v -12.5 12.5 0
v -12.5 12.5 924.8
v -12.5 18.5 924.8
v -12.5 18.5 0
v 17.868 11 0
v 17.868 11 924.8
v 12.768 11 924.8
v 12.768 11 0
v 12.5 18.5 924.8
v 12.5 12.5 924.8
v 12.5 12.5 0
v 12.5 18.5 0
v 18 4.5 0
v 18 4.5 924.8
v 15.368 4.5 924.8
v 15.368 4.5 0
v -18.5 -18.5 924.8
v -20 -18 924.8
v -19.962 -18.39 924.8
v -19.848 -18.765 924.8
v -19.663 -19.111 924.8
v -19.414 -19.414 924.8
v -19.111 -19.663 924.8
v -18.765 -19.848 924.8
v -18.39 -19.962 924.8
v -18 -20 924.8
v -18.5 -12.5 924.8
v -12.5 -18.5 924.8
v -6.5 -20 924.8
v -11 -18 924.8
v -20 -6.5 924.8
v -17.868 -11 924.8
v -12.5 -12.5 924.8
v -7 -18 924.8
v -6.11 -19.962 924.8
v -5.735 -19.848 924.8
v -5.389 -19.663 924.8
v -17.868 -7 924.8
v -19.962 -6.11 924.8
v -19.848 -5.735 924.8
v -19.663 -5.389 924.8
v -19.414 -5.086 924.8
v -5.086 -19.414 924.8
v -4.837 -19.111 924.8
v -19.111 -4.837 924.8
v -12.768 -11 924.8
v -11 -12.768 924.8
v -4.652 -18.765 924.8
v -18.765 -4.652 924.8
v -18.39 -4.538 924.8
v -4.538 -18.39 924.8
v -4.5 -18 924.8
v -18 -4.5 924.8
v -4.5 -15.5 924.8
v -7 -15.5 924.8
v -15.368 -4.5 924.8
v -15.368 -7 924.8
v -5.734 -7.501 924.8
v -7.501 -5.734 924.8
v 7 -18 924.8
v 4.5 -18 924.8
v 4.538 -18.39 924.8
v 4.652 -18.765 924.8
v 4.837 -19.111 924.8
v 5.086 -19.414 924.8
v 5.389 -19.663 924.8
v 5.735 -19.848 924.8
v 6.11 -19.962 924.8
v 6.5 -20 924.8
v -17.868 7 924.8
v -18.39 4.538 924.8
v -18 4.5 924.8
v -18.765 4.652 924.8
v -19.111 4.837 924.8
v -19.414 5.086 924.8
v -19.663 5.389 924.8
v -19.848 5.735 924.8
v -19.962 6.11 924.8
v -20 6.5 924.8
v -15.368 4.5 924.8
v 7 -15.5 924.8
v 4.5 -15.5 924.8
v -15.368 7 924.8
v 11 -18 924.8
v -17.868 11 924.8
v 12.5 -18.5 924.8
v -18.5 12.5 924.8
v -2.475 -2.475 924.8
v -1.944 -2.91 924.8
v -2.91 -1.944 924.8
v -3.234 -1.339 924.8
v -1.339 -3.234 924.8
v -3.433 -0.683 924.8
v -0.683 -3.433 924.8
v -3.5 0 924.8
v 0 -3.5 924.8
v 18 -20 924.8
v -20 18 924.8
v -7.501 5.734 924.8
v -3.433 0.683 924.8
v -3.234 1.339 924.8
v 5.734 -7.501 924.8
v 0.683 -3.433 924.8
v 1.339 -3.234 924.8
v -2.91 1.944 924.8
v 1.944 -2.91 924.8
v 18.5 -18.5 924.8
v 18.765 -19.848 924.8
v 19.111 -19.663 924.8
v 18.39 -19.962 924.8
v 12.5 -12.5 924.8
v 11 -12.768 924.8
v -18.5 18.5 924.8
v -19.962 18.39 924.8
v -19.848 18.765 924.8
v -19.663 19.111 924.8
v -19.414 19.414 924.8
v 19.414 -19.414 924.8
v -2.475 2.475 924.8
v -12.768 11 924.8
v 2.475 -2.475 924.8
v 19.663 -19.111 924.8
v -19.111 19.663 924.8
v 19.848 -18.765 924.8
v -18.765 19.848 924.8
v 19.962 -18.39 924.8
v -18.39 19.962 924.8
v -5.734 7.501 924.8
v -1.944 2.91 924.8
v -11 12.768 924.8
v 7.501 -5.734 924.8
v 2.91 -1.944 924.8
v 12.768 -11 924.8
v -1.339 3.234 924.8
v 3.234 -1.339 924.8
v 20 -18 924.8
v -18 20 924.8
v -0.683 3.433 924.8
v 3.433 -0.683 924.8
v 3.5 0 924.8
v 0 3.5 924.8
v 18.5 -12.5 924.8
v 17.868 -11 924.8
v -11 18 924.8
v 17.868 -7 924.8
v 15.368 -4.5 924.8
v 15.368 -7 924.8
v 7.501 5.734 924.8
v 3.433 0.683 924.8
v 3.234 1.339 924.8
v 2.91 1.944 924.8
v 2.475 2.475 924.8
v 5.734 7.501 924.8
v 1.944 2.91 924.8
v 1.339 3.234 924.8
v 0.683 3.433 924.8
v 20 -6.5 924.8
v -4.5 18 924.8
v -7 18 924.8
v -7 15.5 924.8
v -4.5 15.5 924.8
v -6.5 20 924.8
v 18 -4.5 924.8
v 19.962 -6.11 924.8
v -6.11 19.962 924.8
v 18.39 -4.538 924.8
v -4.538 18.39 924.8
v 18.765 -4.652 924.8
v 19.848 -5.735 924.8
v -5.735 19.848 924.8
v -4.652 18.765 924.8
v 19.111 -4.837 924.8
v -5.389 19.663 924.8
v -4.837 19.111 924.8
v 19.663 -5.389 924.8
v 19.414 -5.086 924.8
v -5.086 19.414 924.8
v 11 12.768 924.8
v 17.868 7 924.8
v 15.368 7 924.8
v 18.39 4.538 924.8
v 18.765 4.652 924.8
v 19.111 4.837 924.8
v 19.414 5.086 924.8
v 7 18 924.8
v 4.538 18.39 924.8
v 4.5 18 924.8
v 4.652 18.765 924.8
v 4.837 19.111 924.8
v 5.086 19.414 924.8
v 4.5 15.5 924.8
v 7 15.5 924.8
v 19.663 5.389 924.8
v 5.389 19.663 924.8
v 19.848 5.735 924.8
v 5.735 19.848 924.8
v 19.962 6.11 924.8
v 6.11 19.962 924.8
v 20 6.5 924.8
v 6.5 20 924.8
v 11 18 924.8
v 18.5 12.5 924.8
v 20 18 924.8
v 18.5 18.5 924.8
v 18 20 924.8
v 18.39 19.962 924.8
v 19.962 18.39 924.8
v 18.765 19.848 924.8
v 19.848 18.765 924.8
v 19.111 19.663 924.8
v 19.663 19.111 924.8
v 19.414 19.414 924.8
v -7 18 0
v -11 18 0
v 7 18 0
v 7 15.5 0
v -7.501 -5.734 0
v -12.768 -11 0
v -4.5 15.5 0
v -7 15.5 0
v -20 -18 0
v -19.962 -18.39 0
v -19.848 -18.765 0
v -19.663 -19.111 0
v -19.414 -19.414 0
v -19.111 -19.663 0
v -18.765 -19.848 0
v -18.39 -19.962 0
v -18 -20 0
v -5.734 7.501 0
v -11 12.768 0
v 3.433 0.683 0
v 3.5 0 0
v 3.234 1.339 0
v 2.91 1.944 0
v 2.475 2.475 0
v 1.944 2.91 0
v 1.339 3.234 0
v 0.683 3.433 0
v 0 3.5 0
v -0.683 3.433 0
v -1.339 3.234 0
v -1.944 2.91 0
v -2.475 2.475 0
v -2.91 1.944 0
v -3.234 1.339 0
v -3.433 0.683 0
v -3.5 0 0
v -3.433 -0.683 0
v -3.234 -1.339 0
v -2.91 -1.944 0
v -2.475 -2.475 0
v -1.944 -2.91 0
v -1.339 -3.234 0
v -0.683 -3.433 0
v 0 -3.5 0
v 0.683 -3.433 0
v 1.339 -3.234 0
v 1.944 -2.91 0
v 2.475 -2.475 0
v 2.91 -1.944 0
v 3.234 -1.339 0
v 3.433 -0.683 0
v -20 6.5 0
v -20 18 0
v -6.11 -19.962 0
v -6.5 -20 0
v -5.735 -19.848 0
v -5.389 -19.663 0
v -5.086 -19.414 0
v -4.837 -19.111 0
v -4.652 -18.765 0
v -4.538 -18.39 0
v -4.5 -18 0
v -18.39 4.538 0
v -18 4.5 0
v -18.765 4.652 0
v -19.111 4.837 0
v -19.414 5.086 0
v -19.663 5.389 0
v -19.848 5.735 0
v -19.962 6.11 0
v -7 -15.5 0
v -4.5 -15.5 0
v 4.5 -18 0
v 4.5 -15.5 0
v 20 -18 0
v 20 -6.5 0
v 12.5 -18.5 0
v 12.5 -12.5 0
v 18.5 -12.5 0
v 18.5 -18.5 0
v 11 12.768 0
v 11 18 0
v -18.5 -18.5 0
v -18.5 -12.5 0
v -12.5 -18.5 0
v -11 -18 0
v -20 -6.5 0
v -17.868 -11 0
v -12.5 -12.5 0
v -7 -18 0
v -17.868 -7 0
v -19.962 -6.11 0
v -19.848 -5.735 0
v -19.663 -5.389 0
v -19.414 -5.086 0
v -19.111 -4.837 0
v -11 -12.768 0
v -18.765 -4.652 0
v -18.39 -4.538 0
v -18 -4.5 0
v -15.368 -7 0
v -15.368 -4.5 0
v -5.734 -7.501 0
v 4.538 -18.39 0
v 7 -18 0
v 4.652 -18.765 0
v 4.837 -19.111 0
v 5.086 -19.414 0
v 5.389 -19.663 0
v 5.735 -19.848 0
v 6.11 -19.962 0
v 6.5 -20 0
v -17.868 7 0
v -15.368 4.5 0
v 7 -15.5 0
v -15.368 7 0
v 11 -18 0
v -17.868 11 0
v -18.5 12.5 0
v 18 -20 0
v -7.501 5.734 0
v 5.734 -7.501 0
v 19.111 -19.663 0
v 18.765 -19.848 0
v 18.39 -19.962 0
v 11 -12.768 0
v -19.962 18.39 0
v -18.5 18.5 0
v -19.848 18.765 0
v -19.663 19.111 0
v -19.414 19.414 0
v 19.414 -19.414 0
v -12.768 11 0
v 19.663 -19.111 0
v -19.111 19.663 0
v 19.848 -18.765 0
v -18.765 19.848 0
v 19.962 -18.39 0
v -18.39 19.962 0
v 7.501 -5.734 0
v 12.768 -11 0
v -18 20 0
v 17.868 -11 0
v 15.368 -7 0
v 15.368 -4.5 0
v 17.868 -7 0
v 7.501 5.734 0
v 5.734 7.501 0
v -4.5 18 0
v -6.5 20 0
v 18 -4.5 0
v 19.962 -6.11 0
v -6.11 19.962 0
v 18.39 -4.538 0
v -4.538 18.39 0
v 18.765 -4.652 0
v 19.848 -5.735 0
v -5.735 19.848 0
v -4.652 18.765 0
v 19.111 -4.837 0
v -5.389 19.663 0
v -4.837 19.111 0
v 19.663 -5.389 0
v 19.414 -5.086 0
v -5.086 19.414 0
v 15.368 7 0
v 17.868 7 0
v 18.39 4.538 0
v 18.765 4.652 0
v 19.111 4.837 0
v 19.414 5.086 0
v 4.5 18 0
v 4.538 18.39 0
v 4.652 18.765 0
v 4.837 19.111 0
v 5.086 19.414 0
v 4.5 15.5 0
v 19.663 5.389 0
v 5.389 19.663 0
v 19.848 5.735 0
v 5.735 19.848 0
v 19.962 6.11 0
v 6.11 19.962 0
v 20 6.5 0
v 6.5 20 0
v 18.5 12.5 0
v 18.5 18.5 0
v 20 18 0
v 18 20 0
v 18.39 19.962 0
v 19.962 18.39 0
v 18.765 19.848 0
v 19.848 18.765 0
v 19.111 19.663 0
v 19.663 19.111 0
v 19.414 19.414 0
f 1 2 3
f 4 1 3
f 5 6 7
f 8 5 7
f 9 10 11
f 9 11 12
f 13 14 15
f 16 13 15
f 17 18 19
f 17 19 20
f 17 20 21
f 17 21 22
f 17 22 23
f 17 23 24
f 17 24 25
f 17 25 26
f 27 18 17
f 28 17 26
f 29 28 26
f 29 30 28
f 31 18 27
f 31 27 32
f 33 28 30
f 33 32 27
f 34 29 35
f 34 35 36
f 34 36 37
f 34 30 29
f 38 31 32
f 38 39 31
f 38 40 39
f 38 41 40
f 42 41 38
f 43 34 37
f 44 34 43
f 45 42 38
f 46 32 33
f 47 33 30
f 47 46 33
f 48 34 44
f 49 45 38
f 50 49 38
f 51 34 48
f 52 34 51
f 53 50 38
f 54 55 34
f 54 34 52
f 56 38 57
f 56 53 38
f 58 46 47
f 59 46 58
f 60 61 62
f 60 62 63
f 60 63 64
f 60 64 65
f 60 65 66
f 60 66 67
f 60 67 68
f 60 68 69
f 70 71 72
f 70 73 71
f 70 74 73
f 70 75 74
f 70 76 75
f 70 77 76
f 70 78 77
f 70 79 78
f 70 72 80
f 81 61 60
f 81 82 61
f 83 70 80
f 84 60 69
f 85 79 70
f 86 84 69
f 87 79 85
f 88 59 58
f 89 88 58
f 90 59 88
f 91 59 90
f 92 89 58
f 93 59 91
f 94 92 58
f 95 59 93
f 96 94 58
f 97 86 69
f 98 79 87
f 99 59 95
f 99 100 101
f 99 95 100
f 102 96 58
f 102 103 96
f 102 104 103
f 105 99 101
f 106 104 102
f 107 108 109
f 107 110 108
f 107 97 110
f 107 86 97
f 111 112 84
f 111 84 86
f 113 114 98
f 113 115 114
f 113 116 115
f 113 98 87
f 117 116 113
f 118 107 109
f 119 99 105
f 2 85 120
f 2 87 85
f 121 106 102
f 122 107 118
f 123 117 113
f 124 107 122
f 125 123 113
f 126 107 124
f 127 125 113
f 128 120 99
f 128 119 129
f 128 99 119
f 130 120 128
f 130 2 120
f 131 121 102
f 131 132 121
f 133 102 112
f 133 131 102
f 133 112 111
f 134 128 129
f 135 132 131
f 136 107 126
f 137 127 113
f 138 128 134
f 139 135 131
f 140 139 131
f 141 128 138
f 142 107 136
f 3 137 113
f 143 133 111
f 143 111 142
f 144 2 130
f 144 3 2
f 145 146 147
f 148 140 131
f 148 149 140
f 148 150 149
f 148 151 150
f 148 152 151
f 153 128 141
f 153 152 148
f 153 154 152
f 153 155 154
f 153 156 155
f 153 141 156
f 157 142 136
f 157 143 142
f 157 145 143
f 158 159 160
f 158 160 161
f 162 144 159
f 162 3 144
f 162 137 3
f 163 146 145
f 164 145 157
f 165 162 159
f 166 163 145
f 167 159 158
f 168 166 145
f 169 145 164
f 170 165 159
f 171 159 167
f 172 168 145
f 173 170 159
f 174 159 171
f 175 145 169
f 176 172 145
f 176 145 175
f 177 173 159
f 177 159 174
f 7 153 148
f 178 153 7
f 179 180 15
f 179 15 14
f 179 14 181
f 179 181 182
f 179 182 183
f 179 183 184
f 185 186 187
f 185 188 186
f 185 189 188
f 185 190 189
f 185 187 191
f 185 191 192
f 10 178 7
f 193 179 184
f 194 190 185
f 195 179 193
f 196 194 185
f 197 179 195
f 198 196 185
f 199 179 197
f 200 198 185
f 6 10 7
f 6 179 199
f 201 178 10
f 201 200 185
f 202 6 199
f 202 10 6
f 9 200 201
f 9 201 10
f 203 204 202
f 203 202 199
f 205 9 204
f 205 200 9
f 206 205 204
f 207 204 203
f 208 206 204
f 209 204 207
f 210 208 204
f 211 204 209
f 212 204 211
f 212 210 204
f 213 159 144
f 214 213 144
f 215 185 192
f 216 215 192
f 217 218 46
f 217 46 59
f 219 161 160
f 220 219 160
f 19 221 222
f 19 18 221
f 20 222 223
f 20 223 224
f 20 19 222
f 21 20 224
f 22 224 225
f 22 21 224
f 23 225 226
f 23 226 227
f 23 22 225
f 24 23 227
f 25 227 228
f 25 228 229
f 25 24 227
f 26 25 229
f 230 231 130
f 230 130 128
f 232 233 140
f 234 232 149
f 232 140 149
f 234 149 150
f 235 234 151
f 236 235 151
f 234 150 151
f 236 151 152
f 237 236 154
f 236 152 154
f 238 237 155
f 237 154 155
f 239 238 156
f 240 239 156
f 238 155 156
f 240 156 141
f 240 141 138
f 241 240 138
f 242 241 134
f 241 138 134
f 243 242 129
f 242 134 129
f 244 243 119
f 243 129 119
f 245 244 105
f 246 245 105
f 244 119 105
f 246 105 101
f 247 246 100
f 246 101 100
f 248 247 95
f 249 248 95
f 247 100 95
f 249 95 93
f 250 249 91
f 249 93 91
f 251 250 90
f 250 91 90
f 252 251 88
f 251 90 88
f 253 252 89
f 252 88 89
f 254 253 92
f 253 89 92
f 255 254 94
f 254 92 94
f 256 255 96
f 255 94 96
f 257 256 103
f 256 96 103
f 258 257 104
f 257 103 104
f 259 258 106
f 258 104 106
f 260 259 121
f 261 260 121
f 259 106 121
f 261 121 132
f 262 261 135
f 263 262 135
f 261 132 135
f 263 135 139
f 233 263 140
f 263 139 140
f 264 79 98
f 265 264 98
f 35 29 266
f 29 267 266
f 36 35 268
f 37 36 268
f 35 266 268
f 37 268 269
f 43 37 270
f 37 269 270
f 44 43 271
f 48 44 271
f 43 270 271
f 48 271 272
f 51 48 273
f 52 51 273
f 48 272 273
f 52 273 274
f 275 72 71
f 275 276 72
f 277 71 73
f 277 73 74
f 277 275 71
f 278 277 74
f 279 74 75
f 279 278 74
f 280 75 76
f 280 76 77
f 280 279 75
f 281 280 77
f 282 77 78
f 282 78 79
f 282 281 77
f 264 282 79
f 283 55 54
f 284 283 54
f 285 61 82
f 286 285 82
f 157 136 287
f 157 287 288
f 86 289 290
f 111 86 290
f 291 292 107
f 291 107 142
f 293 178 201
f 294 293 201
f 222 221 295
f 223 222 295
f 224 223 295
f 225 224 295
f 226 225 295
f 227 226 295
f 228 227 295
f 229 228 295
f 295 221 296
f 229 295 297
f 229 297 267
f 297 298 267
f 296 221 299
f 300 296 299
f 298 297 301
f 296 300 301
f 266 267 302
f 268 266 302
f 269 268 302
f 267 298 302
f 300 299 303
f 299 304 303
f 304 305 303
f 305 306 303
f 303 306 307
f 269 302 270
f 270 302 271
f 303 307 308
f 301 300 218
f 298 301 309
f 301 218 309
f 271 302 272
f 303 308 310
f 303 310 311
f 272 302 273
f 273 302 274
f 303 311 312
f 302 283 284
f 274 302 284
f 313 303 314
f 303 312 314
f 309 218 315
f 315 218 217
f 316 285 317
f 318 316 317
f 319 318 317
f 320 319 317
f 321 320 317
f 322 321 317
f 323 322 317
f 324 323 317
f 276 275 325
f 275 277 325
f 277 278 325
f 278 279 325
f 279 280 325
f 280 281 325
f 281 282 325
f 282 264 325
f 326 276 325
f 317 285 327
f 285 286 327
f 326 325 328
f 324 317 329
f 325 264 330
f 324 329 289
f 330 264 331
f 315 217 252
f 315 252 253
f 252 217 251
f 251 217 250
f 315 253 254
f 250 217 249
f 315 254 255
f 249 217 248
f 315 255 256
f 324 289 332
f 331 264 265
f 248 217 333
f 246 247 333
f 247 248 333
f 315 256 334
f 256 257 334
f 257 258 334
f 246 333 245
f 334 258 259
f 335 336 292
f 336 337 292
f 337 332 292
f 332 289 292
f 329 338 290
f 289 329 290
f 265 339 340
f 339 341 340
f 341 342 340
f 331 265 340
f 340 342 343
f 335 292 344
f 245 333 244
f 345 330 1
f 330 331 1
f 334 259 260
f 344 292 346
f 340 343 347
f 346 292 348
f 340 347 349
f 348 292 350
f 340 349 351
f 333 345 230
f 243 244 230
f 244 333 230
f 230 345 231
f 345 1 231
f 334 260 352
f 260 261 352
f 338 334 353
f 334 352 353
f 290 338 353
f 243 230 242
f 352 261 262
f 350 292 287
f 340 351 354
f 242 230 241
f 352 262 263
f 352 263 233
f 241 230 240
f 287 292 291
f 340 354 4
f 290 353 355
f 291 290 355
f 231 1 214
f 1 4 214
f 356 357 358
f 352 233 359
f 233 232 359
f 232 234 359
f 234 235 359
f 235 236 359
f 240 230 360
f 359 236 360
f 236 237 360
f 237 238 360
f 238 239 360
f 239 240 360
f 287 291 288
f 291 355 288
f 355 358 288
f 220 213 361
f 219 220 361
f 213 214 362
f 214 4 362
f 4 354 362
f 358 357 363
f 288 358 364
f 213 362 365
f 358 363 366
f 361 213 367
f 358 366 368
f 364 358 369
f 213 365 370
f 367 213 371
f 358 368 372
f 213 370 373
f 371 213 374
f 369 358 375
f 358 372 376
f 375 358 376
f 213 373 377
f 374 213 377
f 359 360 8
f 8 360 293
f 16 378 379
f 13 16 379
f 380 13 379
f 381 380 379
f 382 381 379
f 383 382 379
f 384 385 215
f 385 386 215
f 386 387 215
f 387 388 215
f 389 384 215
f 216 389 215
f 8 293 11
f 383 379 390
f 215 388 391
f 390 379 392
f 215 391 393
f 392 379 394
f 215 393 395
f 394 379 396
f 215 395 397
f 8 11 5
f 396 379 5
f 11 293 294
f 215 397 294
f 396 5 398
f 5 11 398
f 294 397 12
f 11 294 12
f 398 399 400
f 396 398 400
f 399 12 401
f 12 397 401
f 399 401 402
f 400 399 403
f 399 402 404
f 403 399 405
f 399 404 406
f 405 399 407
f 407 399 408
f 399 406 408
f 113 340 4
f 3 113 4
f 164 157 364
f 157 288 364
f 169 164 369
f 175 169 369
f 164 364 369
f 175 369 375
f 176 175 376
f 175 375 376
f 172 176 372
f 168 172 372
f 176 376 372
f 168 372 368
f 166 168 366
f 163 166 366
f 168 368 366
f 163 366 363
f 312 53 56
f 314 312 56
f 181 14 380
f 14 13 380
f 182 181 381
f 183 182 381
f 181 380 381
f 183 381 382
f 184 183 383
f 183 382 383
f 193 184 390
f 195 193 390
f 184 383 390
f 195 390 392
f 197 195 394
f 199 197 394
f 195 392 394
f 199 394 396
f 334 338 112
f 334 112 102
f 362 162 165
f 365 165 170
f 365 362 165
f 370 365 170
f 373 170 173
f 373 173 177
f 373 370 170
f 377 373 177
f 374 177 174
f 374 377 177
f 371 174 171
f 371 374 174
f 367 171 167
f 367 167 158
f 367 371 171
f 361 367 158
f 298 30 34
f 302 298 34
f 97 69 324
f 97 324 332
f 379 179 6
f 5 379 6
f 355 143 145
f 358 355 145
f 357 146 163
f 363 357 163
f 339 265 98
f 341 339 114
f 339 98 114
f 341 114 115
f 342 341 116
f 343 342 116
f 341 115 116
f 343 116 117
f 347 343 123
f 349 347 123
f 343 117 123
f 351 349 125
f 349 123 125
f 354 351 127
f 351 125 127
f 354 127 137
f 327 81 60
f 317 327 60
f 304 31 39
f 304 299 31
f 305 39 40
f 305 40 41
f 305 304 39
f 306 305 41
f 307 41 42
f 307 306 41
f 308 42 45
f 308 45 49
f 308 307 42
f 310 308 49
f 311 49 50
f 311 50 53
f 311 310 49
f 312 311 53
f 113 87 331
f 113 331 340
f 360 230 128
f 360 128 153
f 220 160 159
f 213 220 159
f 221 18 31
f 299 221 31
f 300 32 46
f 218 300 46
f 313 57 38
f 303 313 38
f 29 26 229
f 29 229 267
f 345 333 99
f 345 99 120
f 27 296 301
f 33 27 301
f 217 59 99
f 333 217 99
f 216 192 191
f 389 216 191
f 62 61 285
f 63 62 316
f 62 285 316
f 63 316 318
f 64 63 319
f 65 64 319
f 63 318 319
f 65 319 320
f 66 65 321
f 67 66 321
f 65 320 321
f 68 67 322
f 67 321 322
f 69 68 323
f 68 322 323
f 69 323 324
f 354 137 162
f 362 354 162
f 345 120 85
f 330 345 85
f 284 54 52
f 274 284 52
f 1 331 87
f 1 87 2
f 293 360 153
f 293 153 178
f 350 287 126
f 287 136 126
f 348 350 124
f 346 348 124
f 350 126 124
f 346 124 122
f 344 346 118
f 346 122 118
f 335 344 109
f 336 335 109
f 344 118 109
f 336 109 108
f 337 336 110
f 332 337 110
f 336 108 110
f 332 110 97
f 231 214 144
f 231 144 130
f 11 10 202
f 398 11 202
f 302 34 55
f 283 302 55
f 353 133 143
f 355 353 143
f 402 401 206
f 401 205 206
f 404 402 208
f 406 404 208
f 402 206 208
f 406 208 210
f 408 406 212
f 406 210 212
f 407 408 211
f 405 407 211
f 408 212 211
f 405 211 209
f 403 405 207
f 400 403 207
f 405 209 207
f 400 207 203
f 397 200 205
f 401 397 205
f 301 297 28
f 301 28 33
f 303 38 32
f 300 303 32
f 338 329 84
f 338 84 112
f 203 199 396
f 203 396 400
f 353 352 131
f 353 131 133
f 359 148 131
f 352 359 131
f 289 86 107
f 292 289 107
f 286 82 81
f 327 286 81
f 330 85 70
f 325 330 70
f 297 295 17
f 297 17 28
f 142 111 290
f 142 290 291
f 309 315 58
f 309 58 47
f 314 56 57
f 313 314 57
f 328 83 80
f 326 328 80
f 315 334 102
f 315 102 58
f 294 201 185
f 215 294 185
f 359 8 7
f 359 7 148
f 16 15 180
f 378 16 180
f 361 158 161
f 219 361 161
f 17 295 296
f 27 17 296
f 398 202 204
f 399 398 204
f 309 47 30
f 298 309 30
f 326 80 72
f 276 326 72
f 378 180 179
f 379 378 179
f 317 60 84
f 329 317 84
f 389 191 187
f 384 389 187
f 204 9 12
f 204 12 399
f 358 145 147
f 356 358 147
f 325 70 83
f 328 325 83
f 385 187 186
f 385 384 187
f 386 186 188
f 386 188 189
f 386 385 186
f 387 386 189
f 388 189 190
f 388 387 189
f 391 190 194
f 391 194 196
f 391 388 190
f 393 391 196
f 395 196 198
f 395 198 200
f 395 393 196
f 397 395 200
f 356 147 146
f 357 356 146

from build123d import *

# Parameters (mm, degrees)
CROQUIS1_W              = 40
CROQUIS1_H              = 40
SALIENTE_EXTRUIR1_DEPTH = 924.8
CROQUIS2_W              = 6
CROQUIS2_H              = 6
CROQUIS2_R              = 3.5
CORTAR_EXTRUIR2_DEPTH   = 924.8
REDONDEO1_R             = 2
REDONDEO2_R             = 2


with BuildPart() as part:
    # Croquis1 → Saliente-Extruir1 (new body)
    with BuildSketch(Plane.XY):
        Rectangle(CROQUIS1_W, CROQUIS1_H)
    extrude(amount=SALIENTE_EXTRUIR1_DEPTH)

    # Croquis2 → Cortar-Extruir2 (cut)
    with BuildSketch(Plane.XY.offset(924.8)):
        with Locations((-15.5, 15.5)):
            Rectangle(CROQUIS2_W, CROQUIS2_H)
        Polygon((4.5, 15.5), (4.5, 20), (-4.5, 20), (-4.5, 15.5), (-7, 15.5), (-7, 18), (-11, 18), (-11, 12.767766953), (-5.733637236, 7.501404189), (5.733637236, 7.501404189), (11, 12.767766953), (11, 18), (7, 18), (7, 15.5), align=None)
        with Locations((15.5, 15.5)):
            Rectangle(CROQUIS2_W, CROQUIS2_H)
        Polygon((15.367588592, -4.5), (20, -4.5), (20, 4.5), (15.367588592, 4.5), (15.367588592, 7), (17.867588592, 7), (17.867588592, 11), (12.767766953, 11), (7.501349817, 5.733582864), (7.501349817, -5.733582864), (12.767766953, -11), (17.867588592, -11), (17.867588592, -7), (15.367588592, -7), align=None)
        Polygon((-20, 4.5), (-20, -4.5), (-15.367588592, -4.5), (-15.367588592, -7), (-17.867588592, -7), (-17.867588592, -11), (-12.767766953, -11), (-7.501349817, -5.733582864), (-7.501349817, 5.733582864), (-12.767766953, 11), (-17.867588592, 11), (-17.867588592, 7), (-15.367588592, 7), (-15.367588592, 4.5), align=None)
        Circle(CROQUIS2_R)
        Polygon((11, -12.767766953), (5.733637236, -7.501404189), (-5.733637236, -7.501404189), (-11, -12.767766953), (-11, -18), (-7, -18), (-7, -15.5), (-4.5, -15.5), (-4.5, -20), (4.5, -20), (4.5, -15.5), (7, -15.5), (7, -18), (11, -18), align=None)
        with Locations((-15.5, -15.5)):
            Rectangle(CROQUIS2_W, CROQUIS2_H)
        with Locations((15.5, -15.5)):
            Rectangle(CROQUIS2_W, CROQUIS2_H)
    extrude(amount=-CORTAR_EXTRUIR2_DEPTH, mode=Mode.SUBTRACT)

    # Redondeo1
    redondeo1_edges = [part.edges().sort_by_distance(p)[0] for p in [
        (20, -20, 462.4),
        (-20, -20, 462.4),
        (-20, 20, 462.4),
        (20, 20, 462.4),
    ]]
    fillet(redondeo1_edges, radius=REDONDEO1_R)

    # Redondeo2
    redondeo2_edges = [part.edges().sort_by_distance(p)[0] for p in [
        (4.5, 20, 462.4),
        (-4.5, 20, 462.4),
        (20, -4.5, 462.4),
        (20, 4.5, 462.4),
        (-20, 4.5, 462.4),
        (-20, -4.5, 462.4),
        (-4.5, -20, 462.4),
        (4.5, -20, 462.4),
    ]]
    fillet(redondeo2_edges, radius=REDONDEO2_R)


solid = part.part
